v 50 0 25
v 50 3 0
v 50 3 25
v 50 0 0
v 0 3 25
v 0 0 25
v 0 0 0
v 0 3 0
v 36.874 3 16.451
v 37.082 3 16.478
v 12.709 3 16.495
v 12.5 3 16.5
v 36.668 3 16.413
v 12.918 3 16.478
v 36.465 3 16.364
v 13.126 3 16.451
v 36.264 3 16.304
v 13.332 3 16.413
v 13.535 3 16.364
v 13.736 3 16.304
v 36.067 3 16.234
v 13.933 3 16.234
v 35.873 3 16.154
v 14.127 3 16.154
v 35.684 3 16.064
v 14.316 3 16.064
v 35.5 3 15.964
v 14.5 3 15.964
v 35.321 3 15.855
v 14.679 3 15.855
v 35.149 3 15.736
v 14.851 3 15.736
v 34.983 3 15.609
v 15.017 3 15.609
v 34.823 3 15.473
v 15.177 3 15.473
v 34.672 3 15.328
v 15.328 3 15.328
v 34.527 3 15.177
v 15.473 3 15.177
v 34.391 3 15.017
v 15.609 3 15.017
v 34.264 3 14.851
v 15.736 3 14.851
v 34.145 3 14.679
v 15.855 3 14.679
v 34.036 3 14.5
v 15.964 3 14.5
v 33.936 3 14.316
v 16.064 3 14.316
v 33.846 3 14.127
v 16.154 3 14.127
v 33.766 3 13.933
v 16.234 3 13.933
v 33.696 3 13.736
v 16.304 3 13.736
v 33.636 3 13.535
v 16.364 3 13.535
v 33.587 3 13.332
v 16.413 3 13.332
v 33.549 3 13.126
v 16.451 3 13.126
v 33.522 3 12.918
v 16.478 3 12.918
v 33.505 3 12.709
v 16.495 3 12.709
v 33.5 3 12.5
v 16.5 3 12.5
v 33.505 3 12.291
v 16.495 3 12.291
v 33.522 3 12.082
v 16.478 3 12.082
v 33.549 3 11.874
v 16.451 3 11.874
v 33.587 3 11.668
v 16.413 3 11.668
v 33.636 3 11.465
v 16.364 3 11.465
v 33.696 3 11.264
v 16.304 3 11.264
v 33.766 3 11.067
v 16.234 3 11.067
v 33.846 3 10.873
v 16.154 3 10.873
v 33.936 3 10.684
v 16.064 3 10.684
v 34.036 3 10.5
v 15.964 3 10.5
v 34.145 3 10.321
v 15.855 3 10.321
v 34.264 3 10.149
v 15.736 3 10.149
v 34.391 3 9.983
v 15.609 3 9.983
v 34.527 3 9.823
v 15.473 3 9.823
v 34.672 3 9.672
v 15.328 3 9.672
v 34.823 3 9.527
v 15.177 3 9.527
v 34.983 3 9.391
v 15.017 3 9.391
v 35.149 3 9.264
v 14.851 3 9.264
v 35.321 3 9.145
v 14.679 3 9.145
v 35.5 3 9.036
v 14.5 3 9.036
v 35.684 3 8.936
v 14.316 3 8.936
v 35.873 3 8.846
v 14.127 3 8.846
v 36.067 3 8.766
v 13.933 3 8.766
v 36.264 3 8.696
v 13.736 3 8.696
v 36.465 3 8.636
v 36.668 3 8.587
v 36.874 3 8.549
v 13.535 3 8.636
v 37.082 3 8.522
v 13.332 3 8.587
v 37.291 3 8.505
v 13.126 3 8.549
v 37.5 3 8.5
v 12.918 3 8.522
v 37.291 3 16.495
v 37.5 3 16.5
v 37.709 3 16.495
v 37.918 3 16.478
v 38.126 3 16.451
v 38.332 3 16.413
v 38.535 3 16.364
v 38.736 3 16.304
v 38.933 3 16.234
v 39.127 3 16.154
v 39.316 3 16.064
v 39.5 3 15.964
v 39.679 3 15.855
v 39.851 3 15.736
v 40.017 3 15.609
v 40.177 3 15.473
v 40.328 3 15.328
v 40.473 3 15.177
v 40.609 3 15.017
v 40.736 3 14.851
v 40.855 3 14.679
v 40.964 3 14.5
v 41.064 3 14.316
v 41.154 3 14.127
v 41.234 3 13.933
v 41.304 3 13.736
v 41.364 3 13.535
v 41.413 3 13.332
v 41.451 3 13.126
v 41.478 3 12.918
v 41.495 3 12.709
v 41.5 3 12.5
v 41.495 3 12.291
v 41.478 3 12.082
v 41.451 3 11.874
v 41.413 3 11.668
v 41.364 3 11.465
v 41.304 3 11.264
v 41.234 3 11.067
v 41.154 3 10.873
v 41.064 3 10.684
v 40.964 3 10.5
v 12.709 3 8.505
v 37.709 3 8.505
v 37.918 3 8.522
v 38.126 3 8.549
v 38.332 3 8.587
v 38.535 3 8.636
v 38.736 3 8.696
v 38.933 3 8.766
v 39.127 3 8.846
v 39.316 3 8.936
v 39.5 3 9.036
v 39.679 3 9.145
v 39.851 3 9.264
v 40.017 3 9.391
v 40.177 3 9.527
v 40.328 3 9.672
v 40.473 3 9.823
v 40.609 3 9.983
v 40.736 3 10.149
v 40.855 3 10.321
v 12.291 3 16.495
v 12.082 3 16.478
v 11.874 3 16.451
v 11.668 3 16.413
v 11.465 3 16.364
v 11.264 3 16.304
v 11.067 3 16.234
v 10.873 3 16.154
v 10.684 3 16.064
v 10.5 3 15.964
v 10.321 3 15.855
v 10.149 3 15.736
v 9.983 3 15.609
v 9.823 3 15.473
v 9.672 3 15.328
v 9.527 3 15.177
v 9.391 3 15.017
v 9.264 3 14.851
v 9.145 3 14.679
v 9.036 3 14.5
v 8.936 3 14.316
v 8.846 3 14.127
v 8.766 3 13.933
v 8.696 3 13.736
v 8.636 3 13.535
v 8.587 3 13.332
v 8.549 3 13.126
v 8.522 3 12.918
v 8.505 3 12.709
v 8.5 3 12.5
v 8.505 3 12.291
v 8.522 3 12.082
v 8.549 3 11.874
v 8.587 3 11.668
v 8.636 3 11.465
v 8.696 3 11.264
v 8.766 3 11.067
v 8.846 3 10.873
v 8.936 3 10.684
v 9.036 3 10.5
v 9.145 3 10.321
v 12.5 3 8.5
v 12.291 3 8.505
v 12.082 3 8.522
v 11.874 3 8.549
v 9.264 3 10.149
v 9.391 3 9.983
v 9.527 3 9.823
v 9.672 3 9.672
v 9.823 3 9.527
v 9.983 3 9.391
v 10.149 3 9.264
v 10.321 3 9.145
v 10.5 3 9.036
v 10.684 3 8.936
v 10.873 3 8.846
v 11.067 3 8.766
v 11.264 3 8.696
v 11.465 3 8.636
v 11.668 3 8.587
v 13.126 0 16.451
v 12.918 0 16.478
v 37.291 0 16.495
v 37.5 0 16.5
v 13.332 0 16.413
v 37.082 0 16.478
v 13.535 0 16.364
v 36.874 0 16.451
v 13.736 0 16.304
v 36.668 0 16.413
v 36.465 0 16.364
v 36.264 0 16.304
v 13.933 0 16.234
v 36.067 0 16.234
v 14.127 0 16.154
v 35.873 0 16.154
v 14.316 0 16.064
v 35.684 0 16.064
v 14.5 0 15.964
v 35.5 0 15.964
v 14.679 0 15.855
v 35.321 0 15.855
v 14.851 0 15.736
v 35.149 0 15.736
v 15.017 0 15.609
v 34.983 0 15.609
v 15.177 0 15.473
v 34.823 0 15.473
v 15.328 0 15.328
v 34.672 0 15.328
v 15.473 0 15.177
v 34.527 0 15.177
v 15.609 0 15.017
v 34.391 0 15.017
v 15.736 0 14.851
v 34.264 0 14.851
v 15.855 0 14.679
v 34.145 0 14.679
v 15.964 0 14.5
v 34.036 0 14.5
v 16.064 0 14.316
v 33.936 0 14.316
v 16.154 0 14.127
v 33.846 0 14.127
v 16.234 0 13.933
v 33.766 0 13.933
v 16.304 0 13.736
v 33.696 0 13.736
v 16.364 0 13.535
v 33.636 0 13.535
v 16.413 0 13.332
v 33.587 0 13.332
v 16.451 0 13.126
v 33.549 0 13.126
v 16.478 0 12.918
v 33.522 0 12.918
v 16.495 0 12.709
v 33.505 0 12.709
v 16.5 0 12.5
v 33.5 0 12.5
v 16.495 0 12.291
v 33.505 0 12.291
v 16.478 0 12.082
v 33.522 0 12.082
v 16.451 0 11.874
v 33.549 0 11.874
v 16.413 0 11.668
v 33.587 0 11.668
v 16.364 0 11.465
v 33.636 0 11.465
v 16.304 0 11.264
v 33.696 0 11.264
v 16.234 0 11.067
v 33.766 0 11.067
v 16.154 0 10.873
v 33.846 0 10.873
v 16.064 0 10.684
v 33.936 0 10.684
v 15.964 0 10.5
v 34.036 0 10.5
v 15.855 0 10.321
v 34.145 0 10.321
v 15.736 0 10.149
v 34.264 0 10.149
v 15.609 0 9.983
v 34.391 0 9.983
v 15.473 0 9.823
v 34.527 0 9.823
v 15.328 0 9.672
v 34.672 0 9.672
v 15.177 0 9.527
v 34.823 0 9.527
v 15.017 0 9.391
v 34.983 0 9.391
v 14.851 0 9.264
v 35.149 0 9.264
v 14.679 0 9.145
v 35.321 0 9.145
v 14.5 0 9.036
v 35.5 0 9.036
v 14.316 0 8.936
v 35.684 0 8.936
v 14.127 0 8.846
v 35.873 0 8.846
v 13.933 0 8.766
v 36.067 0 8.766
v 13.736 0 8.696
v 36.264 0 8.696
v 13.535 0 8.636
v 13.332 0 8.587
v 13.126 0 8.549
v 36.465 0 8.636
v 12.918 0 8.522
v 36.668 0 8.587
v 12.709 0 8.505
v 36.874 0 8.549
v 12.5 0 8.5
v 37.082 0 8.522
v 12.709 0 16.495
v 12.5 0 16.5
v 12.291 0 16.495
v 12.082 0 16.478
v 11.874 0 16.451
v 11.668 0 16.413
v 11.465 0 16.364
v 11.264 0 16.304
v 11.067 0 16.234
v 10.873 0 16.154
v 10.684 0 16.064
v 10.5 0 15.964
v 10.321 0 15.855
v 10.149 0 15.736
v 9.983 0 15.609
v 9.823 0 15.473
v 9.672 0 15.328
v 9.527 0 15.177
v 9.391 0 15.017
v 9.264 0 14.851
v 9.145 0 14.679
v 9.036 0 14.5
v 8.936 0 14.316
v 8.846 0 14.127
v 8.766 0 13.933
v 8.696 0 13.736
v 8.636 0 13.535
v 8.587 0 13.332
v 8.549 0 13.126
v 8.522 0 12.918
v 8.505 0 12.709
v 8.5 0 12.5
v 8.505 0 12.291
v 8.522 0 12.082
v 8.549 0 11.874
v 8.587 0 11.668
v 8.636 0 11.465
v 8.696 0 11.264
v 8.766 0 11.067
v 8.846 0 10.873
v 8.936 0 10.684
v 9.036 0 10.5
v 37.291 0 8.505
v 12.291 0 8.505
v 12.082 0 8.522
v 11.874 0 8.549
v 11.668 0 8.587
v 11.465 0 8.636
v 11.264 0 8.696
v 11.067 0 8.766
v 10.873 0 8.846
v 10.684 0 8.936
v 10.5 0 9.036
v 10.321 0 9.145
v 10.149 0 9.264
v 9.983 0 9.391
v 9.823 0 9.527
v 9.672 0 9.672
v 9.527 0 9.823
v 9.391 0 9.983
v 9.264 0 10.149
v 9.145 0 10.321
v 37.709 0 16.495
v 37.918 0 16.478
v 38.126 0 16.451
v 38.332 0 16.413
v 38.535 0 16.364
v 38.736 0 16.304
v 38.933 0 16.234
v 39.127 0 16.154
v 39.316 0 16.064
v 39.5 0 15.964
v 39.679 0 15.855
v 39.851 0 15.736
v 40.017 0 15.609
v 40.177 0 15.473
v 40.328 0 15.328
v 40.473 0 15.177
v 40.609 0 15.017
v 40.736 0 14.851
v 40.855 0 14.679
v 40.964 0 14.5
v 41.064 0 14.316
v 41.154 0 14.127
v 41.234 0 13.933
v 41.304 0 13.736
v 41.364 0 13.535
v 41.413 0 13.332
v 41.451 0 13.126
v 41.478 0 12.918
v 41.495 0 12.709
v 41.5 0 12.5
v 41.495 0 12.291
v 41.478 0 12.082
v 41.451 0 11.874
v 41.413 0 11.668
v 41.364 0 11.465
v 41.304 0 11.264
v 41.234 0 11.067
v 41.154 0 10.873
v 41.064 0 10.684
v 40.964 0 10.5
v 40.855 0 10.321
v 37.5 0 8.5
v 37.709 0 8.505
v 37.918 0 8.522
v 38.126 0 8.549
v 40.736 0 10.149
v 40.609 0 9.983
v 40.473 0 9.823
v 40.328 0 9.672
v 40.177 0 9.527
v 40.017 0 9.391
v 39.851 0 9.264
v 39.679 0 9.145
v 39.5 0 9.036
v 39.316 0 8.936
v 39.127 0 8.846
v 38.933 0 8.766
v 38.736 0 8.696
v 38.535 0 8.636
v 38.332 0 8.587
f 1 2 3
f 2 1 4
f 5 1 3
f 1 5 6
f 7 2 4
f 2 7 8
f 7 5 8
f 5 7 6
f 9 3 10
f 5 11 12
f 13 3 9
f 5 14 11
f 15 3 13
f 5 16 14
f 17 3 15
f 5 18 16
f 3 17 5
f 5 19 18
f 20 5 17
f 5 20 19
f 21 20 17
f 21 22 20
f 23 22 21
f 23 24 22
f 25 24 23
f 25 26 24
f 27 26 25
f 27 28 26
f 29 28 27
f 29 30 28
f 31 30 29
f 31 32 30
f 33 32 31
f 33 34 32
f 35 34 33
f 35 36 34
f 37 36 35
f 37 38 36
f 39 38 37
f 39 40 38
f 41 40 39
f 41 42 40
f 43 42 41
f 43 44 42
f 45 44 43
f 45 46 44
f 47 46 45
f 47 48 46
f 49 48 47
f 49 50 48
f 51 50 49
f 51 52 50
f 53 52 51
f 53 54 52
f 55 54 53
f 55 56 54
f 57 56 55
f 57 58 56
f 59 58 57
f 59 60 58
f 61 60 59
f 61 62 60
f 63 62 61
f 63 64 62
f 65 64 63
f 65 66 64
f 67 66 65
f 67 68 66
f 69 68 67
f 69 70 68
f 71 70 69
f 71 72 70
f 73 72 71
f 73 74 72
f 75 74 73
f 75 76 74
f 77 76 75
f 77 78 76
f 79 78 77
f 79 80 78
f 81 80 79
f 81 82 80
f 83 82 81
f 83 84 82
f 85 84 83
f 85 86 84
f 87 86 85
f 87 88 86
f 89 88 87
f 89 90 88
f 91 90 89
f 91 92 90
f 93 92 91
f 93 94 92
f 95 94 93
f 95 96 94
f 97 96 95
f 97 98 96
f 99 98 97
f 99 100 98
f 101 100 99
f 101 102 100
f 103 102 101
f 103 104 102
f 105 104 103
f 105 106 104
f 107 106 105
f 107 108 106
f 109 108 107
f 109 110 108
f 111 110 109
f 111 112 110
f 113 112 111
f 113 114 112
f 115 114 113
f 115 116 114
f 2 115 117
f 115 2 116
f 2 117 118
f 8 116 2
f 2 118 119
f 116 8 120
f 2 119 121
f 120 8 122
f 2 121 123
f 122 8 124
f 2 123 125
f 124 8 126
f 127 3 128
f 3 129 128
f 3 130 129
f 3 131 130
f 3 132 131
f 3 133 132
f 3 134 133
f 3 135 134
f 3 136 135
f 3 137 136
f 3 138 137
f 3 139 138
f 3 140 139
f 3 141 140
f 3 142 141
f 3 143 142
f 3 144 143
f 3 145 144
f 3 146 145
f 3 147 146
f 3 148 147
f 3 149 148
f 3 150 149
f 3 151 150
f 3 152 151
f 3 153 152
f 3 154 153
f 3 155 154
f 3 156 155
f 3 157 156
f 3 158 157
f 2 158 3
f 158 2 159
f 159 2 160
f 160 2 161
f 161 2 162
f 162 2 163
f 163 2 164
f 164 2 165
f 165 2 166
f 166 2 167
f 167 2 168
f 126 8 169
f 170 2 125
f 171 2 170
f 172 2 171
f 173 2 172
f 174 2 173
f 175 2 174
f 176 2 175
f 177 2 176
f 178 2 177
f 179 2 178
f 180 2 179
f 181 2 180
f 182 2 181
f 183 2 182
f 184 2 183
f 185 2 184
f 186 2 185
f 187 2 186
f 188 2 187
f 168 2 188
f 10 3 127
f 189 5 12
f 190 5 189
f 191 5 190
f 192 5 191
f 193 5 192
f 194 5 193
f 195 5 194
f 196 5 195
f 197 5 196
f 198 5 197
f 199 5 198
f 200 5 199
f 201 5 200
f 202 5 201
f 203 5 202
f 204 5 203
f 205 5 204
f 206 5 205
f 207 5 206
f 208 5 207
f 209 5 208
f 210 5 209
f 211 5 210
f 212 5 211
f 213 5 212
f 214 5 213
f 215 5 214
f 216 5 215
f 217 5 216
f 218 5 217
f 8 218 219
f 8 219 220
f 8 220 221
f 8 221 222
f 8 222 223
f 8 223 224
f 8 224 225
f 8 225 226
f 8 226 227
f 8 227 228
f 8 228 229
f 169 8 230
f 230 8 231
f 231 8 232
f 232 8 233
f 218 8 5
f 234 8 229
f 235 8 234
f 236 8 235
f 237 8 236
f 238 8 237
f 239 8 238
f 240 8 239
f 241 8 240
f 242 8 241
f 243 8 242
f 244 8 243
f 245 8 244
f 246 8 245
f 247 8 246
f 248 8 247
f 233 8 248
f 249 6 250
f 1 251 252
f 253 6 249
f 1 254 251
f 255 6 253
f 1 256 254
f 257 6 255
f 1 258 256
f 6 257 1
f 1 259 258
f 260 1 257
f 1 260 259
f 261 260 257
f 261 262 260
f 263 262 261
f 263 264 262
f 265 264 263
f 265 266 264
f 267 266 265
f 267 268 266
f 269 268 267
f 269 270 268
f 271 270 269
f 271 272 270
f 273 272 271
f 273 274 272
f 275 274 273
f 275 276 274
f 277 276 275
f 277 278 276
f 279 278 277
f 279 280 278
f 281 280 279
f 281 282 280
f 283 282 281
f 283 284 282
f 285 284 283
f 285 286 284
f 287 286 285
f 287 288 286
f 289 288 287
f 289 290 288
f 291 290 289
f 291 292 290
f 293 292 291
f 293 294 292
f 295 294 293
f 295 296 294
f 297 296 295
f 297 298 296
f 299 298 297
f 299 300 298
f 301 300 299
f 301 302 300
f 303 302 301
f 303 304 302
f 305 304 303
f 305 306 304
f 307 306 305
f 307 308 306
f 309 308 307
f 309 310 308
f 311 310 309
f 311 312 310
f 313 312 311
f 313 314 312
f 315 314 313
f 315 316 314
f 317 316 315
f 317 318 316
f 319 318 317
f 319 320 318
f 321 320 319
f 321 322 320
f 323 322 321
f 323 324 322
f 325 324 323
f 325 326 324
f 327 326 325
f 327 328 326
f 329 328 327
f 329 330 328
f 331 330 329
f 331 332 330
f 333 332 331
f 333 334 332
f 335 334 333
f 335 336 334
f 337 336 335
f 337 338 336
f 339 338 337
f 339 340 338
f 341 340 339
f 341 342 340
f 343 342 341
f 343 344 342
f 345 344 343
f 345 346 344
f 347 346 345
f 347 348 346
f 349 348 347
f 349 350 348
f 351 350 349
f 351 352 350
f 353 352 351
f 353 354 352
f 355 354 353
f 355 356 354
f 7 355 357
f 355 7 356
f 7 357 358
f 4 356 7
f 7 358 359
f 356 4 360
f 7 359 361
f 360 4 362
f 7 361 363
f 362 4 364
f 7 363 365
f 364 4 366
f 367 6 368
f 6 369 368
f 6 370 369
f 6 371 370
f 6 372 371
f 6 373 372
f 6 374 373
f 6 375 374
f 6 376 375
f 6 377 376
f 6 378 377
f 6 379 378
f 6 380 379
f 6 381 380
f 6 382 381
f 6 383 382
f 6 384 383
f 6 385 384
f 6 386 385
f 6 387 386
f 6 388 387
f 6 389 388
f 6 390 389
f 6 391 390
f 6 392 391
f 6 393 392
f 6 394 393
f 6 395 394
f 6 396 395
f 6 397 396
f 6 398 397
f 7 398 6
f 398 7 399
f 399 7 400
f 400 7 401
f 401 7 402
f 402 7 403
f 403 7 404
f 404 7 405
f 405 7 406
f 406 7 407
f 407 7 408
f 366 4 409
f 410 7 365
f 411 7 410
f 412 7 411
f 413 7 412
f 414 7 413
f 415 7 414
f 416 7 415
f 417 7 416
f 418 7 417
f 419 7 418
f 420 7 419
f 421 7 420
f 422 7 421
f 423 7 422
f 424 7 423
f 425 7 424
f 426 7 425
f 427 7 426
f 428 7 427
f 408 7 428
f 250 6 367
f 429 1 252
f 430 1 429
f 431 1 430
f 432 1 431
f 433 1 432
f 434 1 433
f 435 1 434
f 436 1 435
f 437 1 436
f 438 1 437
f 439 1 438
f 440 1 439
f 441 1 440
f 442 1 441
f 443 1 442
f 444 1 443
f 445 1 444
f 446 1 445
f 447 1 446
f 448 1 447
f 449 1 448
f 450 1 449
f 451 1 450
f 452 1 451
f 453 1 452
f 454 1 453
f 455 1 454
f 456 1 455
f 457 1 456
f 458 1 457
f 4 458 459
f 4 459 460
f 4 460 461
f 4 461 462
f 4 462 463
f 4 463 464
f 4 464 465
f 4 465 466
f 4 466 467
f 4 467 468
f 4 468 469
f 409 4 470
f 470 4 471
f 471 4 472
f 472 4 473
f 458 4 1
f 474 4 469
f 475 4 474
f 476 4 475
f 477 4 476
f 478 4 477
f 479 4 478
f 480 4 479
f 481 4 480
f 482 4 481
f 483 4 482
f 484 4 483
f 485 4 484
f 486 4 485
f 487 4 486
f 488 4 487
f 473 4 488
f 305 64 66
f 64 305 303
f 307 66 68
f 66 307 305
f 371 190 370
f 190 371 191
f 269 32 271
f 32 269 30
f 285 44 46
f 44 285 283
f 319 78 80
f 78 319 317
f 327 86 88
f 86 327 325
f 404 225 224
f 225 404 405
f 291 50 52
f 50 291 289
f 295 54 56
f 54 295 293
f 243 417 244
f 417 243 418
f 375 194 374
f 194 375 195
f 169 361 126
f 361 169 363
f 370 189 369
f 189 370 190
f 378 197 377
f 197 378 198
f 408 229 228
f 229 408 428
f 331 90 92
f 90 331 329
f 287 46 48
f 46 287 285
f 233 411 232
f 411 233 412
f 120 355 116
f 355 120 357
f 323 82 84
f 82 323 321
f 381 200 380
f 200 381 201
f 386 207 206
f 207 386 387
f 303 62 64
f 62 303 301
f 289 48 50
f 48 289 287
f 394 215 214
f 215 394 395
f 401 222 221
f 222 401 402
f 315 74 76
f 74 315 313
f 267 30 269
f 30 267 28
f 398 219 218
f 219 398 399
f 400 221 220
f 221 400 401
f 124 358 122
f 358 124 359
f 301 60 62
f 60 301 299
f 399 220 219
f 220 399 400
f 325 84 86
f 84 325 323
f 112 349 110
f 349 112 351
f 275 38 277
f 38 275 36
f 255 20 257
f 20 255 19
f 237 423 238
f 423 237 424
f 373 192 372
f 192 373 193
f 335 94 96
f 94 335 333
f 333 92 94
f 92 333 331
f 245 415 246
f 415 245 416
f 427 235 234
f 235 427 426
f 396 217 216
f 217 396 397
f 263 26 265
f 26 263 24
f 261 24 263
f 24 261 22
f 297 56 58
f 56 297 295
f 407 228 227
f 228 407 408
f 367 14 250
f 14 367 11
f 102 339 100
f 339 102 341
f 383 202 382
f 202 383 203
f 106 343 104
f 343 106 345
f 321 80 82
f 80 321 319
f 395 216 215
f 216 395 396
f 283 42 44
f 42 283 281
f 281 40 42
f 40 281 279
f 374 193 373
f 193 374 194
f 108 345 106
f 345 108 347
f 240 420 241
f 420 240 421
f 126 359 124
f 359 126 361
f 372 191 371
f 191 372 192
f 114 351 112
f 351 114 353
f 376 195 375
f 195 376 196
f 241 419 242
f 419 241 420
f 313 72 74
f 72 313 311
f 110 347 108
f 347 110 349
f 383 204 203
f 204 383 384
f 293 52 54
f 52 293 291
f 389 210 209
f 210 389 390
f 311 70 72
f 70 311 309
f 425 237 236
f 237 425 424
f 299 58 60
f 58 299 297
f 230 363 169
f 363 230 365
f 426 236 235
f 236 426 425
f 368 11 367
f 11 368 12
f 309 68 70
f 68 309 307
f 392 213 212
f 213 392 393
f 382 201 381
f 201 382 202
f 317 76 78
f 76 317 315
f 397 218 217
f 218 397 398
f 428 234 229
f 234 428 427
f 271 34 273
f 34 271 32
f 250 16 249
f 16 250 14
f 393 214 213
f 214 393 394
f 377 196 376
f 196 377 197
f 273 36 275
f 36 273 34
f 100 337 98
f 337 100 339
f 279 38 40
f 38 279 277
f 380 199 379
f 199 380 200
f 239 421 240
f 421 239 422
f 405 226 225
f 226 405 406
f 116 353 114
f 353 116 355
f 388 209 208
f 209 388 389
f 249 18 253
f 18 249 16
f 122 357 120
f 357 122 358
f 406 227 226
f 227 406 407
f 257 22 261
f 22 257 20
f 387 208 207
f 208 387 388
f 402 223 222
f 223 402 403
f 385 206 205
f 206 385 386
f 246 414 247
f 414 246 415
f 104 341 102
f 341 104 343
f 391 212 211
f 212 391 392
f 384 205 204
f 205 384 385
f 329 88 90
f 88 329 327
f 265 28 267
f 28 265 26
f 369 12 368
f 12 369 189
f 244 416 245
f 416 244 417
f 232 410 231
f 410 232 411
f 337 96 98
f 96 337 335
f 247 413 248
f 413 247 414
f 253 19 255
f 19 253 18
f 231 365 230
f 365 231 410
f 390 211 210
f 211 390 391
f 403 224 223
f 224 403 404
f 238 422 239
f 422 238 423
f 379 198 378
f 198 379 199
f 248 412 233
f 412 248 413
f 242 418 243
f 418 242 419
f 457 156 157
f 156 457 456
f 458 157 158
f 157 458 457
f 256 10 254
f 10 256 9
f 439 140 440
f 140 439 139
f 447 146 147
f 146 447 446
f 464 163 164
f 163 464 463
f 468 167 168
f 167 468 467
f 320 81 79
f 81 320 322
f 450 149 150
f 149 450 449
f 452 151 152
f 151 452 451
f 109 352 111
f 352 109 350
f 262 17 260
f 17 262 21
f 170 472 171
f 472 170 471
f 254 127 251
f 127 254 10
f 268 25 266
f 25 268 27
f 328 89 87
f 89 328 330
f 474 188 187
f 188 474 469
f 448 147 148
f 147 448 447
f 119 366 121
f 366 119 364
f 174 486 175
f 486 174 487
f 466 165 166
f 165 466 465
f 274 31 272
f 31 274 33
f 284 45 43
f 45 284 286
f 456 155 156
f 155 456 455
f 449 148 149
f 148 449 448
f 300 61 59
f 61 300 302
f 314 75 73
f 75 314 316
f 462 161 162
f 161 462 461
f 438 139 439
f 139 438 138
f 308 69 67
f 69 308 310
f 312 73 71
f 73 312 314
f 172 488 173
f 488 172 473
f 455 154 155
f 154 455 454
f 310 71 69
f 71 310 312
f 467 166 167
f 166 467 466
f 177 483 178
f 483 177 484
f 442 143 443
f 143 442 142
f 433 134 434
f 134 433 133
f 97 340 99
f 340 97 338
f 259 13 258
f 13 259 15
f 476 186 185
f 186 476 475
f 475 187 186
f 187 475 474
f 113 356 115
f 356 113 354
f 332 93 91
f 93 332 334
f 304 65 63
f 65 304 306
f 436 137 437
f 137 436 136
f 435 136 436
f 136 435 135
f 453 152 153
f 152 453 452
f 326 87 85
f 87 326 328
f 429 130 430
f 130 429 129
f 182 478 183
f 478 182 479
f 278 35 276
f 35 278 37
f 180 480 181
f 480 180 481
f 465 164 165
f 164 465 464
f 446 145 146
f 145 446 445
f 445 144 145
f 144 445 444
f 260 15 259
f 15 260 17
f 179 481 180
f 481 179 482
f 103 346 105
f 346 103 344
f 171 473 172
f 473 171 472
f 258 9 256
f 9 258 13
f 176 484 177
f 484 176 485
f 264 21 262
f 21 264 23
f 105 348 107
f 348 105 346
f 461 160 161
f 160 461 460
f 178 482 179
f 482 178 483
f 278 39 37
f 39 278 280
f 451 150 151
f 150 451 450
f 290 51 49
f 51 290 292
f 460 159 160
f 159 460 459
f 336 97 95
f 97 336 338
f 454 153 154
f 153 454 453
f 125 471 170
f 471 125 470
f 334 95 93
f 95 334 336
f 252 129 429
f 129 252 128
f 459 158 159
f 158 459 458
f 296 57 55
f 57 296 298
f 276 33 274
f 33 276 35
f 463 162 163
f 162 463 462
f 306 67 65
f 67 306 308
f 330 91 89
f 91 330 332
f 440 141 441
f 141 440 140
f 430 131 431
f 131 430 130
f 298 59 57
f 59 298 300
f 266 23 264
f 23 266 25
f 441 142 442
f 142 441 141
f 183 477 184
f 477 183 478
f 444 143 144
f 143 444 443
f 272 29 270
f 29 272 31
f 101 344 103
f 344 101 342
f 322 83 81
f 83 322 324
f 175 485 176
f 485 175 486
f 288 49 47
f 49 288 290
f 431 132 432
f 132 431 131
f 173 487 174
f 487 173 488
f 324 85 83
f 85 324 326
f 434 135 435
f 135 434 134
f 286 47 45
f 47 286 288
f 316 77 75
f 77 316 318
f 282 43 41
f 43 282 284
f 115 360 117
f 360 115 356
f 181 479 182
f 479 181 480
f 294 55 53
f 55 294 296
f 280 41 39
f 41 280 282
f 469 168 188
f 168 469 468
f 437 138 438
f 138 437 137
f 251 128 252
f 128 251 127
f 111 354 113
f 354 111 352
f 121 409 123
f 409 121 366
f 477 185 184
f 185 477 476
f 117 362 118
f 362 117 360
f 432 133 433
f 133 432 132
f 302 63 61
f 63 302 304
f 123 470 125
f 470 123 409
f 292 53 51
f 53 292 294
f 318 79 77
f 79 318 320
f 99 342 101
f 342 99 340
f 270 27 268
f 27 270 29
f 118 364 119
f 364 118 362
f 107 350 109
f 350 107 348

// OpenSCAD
$fn = 120;

module hole(r=4) {
    translate([0,4,0]) rotate ([90,0,0]) cylinder(5,r,r);
}

difference() {
    cube([50,3,25]);
    translate([12.5,0,12.5]) hole();
    translate([37.5,0,12.5]) hole();
}
